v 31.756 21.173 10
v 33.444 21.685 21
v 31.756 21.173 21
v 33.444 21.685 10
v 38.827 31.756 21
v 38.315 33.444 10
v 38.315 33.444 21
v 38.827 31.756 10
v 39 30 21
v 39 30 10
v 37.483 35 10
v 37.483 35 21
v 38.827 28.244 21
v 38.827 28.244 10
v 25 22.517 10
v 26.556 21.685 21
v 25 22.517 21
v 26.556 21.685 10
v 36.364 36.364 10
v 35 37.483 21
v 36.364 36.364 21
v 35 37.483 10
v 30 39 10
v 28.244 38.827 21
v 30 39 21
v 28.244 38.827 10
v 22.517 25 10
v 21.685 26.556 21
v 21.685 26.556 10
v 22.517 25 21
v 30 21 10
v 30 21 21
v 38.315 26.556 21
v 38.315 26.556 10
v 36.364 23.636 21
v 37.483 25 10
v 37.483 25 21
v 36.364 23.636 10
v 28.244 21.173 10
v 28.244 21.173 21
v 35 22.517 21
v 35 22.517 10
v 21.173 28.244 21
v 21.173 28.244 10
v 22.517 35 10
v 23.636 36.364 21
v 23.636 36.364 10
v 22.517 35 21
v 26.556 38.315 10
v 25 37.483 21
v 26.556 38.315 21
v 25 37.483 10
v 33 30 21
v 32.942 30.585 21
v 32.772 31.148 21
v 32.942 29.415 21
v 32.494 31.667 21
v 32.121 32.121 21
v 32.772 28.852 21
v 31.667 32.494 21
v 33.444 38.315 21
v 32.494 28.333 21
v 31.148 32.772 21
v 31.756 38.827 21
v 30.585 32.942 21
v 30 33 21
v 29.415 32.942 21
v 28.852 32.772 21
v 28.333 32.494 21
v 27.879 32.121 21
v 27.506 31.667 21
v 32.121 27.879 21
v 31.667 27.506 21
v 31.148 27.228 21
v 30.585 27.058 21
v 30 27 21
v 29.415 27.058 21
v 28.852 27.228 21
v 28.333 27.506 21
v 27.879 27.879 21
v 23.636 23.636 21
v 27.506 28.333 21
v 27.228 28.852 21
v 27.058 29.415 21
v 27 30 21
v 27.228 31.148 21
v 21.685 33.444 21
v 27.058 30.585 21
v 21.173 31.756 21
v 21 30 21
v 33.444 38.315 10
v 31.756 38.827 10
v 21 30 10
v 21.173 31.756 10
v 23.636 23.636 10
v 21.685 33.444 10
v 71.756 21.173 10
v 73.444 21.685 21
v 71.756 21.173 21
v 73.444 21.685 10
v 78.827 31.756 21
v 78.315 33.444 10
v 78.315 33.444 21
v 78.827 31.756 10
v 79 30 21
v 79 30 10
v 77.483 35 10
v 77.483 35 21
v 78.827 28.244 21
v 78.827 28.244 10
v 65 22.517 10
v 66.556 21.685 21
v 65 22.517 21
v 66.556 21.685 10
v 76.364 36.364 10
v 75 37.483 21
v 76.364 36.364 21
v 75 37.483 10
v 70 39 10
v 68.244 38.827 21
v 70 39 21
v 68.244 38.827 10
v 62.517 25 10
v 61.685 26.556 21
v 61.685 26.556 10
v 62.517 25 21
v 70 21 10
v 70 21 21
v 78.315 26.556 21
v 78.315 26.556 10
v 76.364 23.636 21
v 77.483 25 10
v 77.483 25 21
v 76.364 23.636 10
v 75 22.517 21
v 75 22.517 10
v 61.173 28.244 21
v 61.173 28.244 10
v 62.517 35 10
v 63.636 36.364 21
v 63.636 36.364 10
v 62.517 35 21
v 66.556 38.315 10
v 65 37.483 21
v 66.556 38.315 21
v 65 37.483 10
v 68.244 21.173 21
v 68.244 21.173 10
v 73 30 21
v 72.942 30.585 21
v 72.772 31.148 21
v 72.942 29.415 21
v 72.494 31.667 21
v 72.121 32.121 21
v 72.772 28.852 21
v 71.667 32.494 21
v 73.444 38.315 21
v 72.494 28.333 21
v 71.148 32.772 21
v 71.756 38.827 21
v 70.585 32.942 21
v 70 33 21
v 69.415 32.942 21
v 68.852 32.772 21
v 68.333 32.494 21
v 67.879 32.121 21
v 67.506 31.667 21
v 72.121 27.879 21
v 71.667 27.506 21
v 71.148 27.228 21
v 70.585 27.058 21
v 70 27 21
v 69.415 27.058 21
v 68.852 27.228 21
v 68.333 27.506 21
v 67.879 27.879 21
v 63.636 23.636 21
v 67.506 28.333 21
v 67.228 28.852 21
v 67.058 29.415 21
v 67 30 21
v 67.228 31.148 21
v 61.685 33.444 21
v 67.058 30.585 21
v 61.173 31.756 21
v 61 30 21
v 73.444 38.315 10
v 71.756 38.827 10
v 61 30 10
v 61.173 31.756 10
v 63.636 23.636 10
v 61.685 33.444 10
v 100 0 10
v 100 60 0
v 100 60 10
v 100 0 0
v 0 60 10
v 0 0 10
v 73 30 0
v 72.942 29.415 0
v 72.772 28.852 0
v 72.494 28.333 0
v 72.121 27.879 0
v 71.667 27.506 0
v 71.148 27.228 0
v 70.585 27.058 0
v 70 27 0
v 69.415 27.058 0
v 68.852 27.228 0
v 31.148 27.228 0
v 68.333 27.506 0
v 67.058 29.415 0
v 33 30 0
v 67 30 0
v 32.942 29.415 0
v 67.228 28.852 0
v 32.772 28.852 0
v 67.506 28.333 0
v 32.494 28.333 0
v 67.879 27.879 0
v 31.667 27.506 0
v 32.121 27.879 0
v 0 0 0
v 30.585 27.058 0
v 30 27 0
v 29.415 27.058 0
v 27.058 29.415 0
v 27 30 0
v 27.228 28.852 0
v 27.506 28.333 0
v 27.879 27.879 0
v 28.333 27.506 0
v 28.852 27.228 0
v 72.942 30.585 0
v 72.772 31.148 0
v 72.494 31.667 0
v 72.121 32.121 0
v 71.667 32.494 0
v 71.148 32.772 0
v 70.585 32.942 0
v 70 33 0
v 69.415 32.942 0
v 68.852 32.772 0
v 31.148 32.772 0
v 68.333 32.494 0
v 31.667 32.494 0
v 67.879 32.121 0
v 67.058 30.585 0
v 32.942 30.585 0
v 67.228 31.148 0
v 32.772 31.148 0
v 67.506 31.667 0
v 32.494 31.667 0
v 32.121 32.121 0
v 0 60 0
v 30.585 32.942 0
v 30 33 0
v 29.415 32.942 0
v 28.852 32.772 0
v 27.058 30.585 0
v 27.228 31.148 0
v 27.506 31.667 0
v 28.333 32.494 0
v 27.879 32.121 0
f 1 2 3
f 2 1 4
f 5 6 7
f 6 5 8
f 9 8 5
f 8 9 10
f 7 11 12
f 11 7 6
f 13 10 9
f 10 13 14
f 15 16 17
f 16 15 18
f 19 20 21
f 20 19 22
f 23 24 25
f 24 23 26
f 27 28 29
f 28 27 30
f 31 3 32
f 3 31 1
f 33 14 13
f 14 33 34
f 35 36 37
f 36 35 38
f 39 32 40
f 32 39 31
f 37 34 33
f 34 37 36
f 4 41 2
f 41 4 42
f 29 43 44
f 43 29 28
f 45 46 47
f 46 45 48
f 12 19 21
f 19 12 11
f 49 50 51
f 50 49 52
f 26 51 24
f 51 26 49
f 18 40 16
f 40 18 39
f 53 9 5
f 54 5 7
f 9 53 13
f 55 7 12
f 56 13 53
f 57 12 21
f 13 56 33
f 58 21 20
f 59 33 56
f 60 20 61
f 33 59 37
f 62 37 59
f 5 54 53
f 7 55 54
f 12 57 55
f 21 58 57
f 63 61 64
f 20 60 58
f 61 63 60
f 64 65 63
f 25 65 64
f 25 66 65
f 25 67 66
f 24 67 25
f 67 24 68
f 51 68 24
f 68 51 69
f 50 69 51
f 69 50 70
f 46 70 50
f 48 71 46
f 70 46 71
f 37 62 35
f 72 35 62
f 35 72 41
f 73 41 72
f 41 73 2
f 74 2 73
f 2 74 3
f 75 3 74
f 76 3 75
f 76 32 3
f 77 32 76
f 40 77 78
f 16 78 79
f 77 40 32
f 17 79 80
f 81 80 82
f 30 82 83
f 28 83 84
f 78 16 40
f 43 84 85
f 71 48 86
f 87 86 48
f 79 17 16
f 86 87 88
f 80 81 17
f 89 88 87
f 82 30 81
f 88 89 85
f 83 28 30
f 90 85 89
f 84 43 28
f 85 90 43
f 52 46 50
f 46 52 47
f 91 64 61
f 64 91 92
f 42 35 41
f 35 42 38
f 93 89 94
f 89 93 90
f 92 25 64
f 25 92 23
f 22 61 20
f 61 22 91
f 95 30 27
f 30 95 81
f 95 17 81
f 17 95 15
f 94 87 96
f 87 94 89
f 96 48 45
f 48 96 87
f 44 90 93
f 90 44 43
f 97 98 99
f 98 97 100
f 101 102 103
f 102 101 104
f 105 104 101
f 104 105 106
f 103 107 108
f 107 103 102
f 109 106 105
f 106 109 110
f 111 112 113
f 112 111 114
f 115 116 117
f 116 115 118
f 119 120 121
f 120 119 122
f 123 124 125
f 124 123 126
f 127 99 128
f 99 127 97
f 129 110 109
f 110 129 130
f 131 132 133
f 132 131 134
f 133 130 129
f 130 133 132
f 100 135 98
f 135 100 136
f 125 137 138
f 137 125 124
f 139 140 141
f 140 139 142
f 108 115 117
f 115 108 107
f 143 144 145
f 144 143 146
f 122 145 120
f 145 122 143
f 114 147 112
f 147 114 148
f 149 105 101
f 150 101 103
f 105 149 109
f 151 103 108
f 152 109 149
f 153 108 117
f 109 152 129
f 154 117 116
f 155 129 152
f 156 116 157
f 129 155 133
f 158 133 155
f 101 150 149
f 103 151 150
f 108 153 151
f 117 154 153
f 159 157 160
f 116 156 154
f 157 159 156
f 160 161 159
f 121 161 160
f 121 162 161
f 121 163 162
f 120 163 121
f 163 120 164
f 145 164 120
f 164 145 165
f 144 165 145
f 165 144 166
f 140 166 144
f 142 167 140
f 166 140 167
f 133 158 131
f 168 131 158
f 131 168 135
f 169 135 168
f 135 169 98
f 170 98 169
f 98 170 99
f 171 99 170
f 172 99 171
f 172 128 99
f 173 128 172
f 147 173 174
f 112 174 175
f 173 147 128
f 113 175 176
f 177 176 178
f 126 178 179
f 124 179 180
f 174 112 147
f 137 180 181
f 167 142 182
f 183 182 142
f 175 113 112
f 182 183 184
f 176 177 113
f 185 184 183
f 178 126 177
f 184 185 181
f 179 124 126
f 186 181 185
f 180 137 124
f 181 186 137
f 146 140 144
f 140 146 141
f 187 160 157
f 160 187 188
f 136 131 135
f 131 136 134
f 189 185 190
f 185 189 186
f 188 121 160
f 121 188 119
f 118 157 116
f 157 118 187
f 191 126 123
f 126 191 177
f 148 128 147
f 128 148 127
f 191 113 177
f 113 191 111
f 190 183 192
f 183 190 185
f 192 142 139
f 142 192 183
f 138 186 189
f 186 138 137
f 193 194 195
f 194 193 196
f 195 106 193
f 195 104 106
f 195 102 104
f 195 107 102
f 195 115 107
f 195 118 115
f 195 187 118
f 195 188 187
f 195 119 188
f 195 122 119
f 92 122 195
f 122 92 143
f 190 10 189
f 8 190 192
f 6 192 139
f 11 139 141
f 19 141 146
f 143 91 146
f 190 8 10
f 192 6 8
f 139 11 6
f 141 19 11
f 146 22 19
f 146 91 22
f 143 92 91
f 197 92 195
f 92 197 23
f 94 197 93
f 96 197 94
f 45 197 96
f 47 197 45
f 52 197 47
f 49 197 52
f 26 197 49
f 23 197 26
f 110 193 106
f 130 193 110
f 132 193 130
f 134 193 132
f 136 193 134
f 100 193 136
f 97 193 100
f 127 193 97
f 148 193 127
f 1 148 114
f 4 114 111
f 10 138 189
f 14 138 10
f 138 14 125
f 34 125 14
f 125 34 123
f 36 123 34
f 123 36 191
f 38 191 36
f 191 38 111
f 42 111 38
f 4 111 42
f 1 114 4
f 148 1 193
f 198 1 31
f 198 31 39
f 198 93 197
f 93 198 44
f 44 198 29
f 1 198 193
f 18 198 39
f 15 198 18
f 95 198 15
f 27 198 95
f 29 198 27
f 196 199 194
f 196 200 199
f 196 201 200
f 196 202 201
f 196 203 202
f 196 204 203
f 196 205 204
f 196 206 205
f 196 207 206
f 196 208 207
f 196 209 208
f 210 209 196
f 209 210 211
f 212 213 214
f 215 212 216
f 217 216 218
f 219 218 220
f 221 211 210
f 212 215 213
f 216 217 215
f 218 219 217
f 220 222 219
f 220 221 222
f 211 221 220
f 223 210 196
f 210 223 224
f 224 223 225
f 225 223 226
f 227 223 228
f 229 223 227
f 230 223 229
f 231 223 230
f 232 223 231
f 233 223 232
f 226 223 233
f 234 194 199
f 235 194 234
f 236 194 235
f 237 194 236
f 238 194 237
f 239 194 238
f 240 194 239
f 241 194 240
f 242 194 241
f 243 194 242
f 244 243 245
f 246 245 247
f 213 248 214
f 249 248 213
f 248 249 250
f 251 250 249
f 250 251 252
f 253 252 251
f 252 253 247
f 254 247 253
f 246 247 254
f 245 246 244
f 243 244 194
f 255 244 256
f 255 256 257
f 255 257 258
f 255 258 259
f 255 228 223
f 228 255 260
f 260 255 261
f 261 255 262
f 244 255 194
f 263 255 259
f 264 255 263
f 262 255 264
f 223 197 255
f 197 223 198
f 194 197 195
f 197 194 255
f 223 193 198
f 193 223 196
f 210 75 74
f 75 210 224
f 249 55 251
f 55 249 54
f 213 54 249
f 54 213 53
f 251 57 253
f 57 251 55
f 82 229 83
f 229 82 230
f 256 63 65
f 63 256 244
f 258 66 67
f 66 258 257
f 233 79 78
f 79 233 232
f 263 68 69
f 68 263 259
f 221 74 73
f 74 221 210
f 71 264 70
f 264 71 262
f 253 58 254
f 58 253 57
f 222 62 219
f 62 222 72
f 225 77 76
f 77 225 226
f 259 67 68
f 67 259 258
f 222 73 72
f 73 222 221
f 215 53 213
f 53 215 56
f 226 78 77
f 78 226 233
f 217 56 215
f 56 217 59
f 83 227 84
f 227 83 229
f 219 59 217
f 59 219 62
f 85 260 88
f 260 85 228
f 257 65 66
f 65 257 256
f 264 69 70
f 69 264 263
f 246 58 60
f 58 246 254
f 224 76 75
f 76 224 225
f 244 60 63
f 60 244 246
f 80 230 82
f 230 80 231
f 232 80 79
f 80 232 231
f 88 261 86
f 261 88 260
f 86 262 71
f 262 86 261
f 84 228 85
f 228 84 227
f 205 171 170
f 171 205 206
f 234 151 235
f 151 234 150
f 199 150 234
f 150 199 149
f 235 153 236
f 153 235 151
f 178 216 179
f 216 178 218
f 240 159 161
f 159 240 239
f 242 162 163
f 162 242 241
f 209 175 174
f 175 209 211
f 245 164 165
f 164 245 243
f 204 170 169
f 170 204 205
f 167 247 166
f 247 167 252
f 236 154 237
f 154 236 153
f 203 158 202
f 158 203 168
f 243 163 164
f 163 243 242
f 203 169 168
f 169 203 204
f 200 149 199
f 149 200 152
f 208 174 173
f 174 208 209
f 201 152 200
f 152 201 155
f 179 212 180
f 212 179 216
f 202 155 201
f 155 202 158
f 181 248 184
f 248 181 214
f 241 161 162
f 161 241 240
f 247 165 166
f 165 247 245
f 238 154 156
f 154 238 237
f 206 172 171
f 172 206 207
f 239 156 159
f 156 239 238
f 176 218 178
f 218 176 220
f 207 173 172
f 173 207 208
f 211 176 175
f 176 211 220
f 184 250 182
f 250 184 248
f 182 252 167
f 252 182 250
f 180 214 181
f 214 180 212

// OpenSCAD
$fn = 32;

// ----------------------------------------------------------------------
// Drill jig: two_boss jig
// ----------------------------------------------------------------------

// --- parameters (mm) ---
plate_l = 100;            // plate length, X
plate_w = 60;             // plate width, Y
plate_t = 10;             // plate thickness
boss_d = 18;              // guide boss diameter
boss_h = 12;              // boss height above the plate
guide_d = 6;              // guide hole diameter
boss_pitch = 40;          // boss pitch

n_boss = 2;  // guide bosses
boss_x0 = (plate_l - (n_boss - 1) * boss_pitch) / 2;  // first boss X
boss_top = plate_t - 1 + boss_h;  // boss crown height
total_h = boss_top;  // overall height

difference() {
  union() {
  cube([plate_l, plate_w, plate_t]);
  for (i = [0 : n_boss - 1])
    translate([boss_x0 + i * boss_pitch, plate_w / 2, plate_t - 1])
      cylinder(h = boss_h, d = boss_d);
  }
  for (i = [0 : n_boss - 1])
    translate([boss_x0 + i * boss_pitch, plate_w / 2, -1])
      cylinder(h = plate_t + boss_h, d = guide_d);
}
